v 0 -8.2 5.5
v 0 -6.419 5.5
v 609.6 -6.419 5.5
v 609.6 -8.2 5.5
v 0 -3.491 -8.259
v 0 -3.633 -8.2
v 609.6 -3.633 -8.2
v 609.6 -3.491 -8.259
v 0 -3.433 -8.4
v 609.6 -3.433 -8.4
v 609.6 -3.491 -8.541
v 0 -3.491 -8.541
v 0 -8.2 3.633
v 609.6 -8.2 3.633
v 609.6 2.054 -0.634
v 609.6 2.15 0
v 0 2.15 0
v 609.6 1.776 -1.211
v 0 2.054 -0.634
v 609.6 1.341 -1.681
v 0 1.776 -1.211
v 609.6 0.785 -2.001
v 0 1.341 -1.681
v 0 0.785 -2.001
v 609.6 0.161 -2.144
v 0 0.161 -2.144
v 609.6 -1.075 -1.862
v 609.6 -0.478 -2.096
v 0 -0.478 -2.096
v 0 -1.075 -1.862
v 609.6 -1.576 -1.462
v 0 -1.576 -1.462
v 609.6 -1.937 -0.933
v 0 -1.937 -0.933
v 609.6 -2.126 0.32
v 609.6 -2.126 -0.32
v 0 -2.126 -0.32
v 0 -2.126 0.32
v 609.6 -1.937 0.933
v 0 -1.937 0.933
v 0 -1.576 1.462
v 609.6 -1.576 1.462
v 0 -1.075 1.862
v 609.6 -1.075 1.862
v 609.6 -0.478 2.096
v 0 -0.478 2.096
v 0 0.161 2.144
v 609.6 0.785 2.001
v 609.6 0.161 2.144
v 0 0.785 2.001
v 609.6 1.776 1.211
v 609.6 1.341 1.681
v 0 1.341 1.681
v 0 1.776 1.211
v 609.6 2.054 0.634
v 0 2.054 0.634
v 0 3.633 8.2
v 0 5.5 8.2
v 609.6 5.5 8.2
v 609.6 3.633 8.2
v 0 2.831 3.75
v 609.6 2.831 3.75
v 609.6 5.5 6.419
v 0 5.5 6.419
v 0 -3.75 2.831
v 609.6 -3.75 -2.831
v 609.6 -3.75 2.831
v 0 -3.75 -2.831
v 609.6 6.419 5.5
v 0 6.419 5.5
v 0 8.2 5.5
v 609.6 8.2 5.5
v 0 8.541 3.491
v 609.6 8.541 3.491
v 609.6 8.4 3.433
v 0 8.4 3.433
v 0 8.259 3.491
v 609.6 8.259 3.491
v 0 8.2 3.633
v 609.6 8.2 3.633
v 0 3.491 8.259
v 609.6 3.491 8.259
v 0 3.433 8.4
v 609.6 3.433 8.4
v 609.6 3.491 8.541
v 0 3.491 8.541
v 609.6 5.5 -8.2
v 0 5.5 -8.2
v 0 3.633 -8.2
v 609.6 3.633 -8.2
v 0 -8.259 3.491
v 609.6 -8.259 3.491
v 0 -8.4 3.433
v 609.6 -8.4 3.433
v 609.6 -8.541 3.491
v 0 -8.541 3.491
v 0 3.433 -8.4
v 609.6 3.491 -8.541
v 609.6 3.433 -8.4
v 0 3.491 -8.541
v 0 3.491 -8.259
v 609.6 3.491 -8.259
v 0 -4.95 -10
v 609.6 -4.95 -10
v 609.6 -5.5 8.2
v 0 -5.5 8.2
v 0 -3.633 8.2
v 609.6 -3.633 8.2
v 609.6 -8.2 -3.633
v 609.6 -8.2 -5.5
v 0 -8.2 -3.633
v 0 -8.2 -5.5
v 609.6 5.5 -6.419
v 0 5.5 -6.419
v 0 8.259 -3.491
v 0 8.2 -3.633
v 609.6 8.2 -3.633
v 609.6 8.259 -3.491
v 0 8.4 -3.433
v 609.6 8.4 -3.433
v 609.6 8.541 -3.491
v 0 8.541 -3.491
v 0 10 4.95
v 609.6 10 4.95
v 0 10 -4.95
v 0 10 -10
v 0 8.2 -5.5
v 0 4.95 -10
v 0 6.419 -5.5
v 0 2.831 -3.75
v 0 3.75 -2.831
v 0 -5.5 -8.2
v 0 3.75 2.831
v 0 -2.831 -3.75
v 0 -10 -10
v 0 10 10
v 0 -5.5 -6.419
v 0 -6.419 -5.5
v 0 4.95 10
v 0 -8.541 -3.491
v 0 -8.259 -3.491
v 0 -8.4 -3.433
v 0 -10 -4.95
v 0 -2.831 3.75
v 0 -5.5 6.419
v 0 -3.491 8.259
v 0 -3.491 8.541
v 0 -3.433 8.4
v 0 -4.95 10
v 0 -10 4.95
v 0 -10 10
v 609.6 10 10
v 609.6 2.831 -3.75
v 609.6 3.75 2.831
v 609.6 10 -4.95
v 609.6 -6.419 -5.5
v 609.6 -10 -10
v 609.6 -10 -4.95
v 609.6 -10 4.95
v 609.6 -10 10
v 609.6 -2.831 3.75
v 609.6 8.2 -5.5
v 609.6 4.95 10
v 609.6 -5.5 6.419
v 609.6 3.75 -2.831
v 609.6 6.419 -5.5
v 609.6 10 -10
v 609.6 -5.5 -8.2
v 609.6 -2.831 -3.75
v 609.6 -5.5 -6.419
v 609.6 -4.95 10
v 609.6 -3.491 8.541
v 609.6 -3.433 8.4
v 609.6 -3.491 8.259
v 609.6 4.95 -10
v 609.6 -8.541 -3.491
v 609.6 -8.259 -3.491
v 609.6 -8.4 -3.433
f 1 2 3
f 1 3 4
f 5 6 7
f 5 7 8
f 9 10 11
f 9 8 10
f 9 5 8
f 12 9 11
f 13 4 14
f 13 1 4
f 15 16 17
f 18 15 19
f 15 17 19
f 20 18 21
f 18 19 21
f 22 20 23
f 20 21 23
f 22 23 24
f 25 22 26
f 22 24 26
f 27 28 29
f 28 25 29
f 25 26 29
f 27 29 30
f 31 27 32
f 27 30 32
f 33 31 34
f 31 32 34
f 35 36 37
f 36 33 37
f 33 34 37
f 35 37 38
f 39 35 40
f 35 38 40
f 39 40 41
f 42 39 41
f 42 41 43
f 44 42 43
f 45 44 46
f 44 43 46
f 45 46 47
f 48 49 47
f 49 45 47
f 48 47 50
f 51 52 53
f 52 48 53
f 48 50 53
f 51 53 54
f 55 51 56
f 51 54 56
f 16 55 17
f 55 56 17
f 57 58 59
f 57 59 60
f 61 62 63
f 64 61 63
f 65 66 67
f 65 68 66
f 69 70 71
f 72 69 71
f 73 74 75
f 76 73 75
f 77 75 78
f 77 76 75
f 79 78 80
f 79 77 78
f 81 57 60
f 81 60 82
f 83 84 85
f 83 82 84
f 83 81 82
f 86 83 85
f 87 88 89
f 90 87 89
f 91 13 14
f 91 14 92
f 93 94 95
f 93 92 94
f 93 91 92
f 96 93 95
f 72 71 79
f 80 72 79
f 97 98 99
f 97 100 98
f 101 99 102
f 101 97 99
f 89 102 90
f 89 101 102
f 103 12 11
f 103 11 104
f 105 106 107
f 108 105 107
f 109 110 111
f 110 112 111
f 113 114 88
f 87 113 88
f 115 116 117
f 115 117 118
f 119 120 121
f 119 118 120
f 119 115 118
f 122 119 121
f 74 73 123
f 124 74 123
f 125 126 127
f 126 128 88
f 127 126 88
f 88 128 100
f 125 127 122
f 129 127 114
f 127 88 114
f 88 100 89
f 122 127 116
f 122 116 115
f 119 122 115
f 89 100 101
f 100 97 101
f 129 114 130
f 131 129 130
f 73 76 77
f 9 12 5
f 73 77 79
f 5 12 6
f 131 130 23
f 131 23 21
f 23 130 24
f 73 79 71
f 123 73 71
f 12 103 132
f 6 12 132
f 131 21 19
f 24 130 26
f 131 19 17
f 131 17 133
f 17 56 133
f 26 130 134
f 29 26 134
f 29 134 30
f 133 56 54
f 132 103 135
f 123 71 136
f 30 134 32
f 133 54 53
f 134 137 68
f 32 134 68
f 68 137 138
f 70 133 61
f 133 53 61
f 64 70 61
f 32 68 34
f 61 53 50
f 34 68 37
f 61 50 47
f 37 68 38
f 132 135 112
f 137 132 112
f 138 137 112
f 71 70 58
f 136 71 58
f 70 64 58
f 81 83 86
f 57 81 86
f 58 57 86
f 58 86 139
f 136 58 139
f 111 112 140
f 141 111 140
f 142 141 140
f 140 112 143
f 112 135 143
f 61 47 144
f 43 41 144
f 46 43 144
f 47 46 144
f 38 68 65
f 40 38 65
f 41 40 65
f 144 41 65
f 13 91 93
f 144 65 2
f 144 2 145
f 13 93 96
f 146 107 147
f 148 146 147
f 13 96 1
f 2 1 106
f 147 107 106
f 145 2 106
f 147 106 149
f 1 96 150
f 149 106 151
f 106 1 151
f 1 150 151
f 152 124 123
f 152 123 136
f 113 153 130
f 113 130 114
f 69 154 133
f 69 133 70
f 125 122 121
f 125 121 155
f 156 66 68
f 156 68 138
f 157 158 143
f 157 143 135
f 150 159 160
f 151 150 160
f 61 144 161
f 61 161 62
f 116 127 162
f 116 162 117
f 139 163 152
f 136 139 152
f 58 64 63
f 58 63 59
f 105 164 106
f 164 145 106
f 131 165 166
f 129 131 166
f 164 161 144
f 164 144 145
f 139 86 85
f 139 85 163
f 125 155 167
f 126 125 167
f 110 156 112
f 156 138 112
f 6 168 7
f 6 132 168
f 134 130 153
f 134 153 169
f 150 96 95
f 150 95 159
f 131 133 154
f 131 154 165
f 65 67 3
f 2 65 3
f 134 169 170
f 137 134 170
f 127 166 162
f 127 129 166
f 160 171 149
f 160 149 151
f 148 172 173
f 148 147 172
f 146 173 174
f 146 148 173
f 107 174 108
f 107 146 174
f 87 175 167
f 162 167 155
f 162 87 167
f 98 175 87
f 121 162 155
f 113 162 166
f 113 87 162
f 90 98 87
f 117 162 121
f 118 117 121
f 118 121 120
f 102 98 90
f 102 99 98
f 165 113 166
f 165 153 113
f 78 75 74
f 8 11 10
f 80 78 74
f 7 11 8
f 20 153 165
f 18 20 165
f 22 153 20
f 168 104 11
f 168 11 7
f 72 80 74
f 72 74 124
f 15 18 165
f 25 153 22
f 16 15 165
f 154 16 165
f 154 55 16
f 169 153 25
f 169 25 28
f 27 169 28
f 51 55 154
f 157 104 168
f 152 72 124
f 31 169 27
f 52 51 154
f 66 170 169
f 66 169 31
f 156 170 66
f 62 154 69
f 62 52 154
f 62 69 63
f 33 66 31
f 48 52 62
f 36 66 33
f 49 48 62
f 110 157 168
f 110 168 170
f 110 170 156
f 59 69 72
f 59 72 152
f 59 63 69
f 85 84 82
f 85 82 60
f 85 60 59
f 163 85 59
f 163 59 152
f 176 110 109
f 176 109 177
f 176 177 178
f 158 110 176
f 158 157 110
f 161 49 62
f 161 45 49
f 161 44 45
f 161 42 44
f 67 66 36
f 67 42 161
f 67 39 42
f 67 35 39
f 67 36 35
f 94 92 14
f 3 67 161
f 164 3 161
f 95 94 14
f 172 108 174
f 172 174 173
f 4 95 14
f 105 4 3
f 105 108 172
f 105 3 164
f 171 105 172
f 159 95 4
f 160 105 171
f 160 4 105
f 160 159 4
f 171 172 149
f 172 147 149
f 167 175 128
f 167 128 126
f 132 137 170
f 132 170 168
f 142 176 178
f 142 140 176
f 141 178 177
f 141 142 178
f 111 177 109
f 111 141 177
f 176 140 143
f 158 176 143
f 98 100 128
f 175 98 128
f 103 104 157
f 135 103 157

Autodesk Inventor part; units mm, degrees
ref_plane "YZ Plane" through (0, 0, 0) normal (1, 0, 0) x (0, 1, 0)
ref_plane "XZ Plane" through (0, 0, 0) normal (0, 1, 0) x (-1, 0, 0)
sketch "Sketch1" plane through (0, 0, 0) normal (1, 0, 0) x (0, 1, 0)
  arc A0 (0, -2.15) -> (2.15, 0) centre (0, 0) ccw
  line L0 (3.75, 0) -> (3.75, -2.8308)
  line L1 (2.8308, -3.75) -> (0, -3.75)
  line L2 (0, 0) -> (10, 0) construction
  line L3 (10, 0) -> (10, -10) construction
  line L4 (10, -10) -> (0, -10) construction
  line L5 (0, -10) -> (0, 0) construction
  line L6 (3.75, -2.8308) -> (6.4192, -5.5)
  line L7 (2.8308, -3.75) -> (5.5, -6.4192)
  line L8 (5.5, -6.4192) -> (5.5, -8.2)
  line L9 (5.5, -8.2) -> (3.15, -8.2)
  line L10 (0, 0) -> (5.5, 0) construction
  line L11 (5.5, 0) -> (5.5, -5.5) construction
  line L12 (5.5, -5.5) -> (0, -5.5) construction
  line L13 (0, -5.5) -> (0, 0) construction
  line L14 (6.4192, -5.5) -> (8.2, -5.5)
  line L15 (3.4914, -8.5414) -> (4.95, -10)
  line L16 (3.6328, -8.2) -> (5.6956, -8.2) construction
  line L17 (8.2, -5.5) -> (8.2, -3.6328)
  line L18 (8.5414, -3.4914) -> (10, -4.95)
  line L19 (10, -4.95) -> (10, -10)
  line L20 (4.95, -10) -> (10, -10)
  arc A1 (2.15, 0) -> (0, -2.15) centre (0, 0) ccw construction
  arc A2 (3.6328, -8.2) -> (3.4914, -8.5414) centre (3.6328, -8.4) ccw
  arc A3 (8.5414, -3.4914) -> (8.2, -3.6328) centre (8.4, -3.6328) ccw
  line L21 (3.75, 0) -> (2.15, 0)
  line L22 (0, -2.15) -> (0, -3.75)
  point P0 (8.2, -3.15)
  dimension "d0" = 4.3
  dimension "d1" = 3.75
  dimension "d2" = 3.75
  dimension "d5" = 10
  dimension "d6" = 10
  dimension "d10" = 5.5
  dimension "d11" = 5.5
  dimension "d12" = 1.8
  dimension "d14" = 1.3
  dimension "d15" = 45
  dimension "d16" = 3.15
  dimension "d17" = 45
  dimension "d18" = 3.15
  dimension "d19" = 1.8
  dimension "d20" = 0.2
extrude "Extrusion1" add sketch "Sketch1" along normal blind 609.6
pattern_circular "Circular Pattern1" count 4 over 360 about axis through (0, 0, 0) along (-1, 0, 0) of "Extrusion1"
ref_plane "Work Plane1" through (0, 4.95, 0) normal (0, 0, 1) x (1, 0, 0)
equation "\"d2\" = d1"
equation "\"d18\" = d16"
equation "\"d19\" = d12"
properties part number "VSlot Extrusion 20x20x650mm" material "Aluminum 6061"
